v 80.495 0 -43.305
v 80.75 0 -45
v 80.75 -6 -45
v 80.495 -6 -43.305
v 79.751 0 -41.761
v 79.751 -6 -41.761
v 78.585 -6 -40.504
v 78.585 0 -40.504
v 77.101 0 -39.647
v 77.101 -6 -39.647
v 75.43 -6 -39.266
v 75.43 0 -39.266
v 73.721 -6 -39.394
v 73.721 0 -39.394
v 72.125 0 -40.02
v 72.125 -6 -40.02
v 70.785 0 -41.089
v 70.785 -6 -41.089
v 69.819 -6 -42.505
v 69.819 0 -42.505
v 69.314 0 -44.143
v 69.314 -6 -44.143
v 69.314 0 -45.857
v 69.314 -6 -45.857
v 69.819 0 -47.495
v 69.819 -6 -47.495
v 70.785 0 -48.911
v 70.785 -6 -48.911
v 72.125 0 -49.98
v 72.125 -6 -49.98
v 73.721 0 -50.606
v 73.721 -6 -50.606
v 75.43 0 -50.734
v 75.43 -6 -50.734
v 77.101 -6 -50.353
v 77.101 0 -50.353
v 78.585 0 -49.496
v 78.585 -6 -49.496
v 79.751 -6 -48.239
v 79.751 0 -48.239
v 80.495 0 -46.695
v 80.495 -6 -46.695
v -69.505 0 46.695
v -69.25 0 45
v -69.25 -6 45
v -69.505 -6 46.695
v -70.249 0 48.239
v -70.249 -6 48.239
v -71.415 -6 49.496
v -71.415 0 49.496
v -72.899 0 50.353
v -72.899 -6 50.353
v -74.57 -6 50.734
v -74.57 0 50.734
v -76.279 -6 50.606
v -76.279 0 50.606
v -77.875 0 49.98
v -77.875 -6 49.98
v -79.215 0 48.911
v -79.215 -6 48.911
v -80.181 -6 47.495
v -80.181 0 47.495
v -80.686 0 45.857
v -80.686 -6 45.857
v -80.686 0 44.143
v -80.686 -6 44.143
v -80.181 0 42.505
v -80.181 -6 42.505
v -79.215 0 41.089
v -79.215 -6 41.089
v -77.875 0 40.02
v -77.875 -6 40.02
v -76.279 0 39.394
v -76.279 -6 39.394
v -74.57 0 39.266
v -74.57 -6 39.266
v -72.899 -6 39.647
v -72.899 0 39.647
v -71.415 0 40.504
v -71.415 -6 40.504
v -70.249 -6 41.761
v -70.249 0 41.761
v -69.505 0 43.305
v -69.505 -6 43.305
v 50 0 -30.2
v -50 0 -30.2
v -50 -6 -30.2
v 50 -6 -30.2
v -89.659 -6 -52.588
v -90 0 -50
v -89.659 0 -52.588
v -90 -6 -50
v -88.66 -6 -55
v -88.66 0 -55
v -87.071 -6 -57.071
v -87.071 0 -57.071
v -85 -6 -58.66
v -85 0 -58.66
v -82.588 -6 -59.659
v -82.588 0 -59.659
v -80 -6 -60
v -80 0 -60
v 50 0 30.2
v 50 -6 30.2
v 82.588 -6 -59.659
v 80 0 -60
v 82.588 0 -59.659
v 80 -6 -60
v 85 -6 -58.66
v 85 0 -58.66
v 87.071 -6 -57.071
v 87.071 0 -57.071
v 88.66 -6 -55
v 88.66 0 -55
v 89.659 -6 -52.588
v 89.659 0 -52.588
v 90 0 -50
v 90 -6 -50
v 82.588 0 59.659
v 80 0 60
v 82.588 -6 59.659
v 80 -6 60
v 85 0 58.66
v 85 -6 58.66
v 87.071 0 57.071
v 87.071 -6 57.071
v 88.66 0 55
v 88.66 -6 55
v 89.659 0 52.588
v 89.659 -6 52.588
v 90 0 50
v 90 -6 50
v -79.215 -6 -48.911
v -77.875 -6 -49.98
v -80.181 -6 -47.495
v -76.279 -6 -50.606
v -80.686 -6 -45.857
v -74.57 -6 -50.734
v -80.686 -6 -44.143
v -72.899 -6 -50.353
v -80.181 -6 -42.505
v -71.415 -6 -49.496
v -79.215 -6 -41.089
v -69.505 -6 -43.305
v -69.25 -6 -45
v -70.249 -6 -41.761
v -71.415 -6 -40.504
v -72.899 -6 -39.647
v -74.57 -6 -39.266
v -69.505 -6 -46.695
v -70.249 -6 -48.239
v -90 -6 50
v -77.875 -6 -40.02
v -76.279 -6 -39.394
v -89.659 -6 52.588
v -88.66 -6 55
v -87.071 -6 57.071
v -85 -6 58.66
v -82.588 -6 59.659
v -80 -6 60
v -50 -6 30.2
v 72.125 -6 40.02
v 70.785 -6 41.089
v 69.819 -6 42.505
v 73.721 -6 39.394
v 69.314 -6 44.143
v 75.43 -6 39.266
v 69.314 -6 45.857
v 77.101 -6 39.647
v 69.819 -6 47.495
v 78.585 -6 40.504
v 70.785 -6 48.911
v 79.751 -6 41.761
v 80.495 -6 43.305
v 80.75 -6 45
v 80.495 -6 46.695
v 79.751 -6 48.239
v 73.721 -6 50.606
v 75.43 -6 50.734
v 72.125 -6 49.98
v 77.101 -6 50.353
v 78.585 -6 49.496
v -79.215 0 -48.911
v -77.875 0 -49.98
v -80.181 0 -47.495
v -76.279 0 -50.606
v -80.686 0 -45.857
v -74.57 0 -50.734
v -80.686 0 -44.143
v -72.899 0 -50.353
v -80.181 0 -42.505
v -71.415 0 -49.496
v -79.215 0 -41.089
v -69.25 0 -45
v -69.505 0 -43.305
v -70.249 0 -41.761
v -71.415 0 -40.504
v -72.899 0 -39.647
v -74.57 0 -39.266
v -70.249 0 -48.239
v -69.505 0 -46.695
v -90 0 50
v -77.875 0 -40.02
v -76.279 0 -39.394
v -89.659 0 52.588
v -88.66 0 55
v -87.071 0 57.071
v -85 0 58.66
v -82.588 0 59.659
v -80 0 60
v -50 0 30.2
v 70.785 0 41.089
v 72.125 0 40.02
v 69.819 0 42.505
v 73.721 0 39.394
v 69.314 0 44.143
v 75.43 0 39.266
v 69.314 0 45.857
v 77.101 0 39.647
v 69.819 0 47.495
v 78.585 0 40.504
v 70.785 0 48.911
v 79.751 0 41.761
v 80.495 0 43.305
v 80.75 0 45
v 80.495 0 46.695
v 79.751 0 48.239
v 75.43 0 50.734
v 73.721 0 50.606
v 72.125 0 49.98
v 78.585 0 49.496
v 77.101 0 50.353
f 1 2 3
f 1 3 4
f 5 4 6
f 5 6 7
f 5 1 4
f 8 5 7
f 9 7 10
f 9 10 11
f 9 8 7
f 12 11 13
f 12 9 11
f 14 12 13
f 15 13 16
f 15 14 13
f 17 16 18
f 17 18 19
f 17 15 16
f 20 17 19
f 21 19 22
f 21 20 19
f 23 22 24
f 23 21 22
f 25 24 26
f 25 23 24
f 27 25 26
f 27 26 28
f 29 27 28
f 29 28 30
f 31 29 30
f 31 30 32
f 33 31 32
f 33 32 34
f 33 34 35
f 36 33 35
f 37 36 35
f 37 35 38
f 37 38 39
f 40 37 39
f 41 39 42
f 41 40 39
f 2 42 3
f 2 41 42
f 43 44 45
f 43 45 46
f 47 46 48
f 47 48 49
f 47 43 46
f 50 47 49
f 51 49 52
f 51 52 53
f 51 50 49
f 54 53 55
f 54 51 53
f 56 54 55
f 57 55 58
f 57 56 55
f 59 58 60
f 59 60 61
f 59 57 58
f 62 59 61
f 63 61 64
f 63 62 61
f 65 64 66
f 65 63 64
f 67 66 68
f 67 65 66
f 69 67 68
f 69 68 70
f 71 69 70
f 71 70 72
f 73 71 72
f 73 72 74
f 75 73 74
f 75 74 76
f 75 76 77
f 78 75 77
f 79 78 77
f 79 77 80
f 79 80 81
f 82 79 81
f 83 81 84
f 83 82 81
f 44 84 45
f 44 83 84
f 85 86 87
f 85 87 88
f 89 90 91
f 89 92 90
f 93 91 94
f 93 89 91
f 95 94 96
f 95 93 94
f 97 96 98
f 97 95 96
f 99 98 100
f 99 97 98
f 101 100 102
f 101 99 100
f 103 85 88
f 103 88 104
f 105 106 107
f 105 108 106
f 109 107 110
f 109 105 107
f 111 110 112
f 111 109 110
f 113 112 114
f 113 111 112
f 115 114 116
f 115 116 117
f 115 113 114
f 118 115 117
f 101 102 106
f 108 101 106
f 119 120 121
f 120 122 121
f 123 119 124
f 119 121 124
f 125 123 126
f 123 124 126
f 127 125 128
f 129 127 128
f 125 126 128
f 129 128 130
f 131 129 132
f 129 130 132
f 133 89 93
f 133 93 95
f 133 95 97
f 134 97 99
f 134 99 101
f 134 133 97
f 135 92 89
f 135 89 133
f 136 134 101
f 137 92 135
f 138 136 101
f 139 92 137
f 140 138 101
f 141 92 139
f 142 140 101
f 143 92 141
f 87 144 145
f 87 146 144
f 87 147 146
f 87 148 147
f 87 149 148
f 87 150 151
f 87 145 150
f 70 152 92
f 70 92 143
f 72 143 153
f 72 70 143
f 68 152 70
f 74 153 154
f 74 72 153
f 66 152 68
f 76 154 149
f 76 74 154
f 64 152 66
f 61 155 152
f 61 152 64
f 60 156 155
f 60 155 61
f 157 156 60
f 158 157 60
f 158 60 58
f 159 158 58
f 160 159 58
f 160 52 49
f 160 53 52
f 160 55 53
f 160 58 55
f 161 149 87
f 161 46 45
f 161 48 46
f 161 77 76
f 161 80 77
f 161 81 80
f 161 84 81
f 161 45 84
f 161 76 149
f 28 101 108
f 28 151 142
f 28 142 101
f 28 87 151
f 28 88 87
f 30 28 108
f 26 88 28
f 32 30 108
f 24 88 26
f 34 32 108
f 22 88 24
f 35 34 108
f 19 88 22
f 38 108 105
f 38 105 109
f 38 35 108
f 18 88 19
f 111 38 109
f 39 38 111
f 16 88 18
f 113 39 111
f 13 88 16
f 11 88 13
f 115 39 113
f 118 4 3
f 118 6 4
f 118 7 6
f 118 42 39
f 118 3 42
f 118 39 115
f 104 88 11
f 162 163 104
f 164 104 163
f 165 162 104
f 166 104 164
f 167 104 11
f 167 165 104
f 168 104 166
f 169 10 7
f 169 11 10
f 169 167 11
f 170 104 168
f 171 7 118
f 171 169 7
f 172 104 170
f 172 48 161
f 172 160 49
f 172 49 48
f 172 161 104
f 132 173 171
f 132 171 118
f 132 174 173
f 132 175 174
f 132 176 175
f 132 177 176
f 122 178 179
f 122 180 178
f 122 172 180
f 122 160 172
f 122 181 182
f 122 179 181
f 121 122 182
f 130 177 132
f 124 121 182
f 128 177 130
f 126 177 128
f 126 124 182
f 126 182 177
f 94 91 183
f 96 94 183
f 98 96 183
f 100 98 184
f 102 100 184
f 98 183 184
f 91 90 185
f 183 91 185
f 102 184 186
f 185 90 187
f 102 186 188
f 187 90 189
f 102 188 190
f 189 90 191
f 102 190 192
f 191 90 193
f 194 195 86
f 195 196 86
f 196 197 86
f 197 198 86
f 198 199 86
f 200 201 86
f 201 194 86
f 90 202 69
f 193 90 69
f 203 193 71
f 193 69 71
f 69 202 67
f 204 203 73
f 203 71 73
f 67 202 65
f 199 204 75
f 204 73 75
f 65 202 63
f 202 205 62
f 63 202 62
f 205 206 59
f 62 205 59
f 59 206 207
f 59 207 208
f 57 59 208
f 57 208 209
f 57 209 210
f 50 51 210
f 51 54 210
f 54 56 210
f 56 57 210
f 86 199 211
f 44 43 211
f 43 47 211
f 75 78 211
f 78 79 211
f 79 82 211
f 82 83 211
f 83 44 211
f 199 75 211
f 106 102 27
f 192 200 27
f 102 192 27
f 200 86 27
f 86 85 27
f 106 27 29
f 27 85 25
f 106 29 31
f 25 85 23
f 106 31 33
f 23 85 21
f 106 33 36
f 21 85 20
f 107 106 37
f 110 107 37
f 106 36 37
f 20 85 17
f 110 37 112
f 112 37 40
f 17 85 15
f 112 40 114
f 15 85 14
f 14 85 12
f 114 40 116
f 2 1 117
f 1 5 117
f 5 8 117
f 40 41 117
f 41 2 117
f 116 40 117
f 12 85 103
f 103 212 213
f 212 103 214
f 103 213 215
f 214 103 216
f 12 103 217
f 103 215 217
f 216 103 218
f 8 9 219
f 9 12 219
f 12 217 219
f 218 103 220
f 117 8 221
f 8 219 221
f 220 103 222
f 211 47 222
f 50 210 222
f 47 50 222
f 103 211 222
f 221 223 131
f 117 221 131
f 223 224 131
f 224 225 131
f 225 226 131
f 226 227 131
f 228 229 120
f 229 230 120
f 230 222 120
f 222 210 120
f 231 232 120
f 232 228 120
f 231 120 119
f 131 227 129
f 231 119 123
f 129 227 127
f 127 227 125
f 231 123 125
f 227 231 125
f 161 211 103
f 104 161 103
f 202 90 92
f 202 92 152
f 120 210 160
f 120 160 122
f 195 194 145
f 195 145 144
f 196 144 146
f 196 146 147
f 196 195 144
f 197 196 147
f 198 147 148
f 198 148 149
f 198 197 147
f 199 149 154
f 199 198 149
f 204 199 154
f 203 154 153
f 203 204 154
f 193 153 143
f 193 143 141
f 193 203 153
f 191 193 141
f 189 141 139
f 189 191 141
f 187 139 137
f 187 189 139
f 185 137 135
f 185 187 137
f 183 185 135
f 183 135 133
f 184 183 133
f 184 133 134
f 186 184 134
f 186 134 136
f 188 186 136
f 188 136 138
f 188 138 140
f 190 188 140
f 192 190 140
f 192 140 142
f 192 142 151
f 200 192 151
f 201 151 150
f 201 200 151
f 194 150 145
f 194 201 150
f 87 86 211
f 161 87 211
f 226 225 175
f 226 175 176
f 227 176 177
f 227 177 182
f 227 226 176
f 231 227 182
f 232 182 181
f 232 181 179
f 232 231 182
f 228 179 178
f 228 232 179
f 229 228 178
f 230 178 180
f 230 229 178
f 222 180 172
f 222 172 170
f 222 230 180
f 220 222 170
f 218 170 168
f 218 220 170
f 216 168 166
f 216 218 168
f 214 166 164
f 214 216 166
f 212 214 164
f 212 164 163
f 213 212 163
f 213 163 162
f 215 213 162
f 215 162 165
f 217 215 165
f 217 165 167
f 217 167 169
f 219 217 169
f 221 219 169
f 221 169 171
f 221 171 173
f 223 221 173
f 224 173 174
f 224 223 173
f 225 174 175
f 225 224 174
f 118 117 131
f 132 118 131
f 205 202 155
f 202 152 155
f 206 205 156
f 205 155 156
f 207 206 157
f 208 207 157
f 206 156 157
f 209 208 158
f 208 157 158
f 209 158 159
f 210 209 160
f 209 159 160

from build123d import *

# Parameters (mm, degrees)
F0_W     = 180
F0_H     = 120
F0_R     = 5.75
F0_W_2   = 100
F0_H_2   = 60.4
F1_DEPTH = 6
F2_R     = 10


with BuildPart() as f1:
    # F0 (on Front) → F1 (new body)
    with BuildSketch(Plane.XZ):
        Rectangle(F0_W, F0_H)
        with Locations((-75, -45)):
            Circle(F0_R, mode=Mode.SUBTRACT)
        with Locations((75, -45)):
            Circle(F0_R, mode=Mode.SUBTRACT)
        with Locations((-75, 45)):
            Circle(F0_R, mode=Mode.SUBTRACT)
        Rectangle(F0_W_2, F0_H_2, mode=Mode.SUBTRACT)
        with Locations((75, 45)):
            Circle(F0_R, mode=Mode.SUBTRACT)
    extrude(amount=F1_DEPTH)

    # F2
    f2_edges = [f1.edges().sort_by_distance(p)[0] for p in [
        (-90, -3, 60),
        (90, -3, 60),
        (90, -3, -60),
        (-90, -3, -60),
    ]]
    fillet(f2_edges, radius=F2_R)


solid = f1.part
